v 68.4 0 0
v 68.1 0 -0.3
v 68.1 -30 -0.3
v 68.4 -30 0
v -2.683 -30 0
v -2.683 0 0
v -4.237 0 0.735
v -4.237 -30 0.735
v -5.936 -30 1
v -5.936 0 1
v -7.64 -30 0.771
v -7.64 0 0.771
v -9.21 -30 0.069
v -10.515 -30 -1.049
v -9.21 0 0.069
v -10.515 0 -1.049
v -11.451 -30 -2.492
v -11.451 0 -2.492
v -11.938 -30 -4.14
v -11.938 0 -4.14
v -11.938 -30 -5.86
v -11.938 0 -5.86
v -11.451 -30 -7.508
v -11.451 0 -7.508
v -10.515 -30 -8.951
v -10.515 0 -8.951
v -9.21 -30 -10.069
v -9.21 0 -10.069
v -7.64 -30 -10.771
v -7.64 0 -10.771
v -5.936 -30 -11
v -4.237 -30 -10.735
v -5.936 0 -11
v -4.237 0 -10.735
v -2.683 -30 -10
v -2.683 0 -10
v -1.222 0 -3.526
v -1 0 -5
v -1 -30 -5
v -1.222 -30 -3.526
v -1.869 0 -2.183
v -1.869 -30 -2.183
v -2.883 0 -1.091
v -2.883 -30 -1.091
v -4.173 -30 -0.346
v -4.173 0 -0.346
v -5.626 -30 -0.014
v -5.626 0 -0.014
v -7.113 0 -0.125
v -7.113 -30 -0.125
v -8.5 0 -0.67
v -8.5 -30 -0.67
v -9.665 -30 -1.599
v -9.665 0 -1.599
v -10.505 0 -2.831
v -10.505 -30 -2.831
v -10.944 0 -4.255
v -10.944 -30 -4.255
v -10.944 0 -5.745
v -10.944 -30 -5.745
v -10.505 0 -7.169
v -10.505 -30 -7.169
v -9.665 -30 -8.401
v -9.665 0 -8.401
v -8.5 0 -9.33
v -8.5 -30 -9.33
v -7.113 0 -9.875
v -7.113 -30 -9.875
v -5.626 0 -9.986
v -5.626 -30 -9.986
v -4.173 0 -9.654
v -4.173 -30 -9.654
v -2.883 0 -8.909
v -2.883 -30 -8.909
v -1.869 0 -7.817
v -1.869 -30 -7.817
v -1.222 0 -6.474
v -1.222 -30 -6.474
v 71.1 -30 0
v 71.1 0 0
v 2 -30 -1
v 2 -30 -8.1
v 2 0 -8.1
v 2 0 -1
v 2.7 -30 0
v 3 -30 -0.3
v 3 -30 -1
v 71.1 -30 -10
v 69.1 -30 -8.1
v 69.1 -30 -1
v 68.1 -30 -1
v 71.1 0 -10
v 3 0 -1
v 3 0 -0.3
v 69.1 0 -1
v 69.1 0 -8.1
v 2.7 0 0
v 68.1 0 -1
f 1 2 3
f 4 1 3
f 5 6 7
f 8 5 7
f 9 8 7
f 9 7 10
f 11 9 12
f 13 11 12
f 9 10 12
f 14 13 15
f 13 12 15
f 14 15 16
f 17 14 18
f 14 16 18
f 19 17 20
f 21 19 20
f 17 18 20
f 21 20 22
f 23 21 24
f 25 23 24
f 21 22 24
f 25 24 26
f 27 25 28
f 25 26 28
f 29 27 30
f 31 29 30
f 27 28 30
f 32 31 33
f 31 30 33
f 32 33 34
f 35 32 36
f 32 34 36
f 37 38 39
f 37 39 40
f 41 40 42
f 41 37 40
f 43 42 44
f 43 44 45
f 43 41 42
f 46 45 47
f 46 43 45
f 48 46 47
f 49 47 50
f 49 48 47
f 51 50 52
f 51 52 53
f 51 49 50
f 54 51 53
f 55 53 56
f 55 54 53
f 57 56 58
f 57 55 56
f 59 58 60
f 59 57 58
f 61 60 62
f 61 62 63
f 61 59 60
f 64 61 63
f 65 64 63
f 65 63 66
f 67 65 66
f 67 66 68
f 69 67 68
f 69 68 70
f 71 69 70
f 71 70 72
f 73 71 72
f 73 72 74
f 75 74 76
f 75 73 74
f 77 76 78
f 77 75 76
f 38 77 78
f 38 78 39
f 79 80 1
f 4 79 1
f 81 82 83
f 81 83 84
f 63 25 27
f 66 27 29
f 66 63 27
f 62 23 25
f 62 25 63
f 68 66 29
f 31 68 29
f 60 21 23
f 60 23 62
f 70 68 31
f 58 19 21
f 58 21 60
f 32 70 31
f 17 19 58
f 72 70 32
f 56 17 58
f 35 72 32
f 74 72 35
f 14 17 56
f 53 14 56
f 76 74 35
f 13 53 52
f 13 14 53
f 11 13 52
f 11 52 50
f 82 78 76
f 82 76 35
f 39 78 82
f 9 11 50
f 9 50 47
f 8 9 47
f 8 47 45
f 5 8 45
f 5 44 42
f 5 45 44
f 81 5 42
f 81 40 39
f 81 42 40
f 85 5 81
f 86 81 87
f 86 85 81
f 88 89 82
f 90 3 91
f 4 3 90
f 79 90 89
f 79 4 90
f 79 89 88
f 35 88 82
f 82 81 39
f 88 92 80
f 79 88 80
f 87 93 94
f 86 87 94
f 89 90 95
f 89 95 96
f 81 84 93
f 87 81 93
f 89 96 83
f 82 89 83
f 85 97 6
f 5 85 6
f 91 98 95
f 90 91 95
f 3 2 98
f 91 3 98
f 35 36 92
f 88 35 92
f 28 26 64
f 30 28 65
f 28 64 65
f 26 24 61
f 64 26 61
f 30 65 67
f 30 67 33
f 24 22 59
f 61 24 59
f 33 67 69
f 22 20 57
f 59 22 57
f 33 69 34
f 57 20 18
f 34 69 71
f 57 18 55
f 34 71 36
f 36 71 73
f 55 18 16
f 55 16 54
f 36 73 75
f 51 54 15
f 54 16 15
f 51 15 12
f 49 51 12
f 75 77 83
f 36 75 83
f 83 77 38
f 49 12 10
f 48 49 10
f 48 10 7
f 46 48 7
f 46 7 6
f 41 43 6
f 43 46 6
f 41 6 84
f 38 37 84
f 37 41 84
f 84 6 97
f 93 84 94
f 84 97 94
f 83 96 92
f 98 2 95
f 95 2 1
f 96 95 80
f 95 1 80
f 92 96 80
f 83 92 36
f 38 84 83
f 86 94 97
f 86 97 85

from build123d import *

# Parameters (mm, degrees)
F0_R     = 5
F1_DEPTH = 30
F2_SIZE  = 0.3


with BuildPart() as f1:
    # F0 (on Front) → F1 (new body)
    with BuildSketch(Plane.XZ):
        with BuildLine():
            Line((3, 0), (0, 0))
            Line((0, 0), (-2.683375, 0))
            ThreePointArc((-2.683375, 0), (-12, -5), (-2.683375, -10))
            Line((-2.683375, -10), (0, -10))
            Line((0, -10), (71.1, -10))
            Line((71.1, -10), (71.1, 0))
            Line((71.1, 0), (68.1, 0))
            Line((68.1, 0), (68.1, -1))
            Line((68.1, -1), (69.1, -1))
            Line((69.1, -1), (69.1, -8.1))
            Line((69.1, -8.1), (2, -8.1))
            Line((2, -8.1), (2, -1))
            Line((2, -1), (3, -1))
            Line((3, -1), (3, 0))
        make_face()
        with Locations((-6, -5)):
            Circle(F0_R, mode=Mode.SUBTRACT)
    extrude(amount=F1_DEPTH)

    # F2
    f2_edges = [f1.edges().sort_by_distance(p)[0] for p in [
        (68.1, -15, 0),
        (3, -15, 0),
    ]]
    chamfer(f2_edges, length=F2_SIZE)


solid = f1.part
